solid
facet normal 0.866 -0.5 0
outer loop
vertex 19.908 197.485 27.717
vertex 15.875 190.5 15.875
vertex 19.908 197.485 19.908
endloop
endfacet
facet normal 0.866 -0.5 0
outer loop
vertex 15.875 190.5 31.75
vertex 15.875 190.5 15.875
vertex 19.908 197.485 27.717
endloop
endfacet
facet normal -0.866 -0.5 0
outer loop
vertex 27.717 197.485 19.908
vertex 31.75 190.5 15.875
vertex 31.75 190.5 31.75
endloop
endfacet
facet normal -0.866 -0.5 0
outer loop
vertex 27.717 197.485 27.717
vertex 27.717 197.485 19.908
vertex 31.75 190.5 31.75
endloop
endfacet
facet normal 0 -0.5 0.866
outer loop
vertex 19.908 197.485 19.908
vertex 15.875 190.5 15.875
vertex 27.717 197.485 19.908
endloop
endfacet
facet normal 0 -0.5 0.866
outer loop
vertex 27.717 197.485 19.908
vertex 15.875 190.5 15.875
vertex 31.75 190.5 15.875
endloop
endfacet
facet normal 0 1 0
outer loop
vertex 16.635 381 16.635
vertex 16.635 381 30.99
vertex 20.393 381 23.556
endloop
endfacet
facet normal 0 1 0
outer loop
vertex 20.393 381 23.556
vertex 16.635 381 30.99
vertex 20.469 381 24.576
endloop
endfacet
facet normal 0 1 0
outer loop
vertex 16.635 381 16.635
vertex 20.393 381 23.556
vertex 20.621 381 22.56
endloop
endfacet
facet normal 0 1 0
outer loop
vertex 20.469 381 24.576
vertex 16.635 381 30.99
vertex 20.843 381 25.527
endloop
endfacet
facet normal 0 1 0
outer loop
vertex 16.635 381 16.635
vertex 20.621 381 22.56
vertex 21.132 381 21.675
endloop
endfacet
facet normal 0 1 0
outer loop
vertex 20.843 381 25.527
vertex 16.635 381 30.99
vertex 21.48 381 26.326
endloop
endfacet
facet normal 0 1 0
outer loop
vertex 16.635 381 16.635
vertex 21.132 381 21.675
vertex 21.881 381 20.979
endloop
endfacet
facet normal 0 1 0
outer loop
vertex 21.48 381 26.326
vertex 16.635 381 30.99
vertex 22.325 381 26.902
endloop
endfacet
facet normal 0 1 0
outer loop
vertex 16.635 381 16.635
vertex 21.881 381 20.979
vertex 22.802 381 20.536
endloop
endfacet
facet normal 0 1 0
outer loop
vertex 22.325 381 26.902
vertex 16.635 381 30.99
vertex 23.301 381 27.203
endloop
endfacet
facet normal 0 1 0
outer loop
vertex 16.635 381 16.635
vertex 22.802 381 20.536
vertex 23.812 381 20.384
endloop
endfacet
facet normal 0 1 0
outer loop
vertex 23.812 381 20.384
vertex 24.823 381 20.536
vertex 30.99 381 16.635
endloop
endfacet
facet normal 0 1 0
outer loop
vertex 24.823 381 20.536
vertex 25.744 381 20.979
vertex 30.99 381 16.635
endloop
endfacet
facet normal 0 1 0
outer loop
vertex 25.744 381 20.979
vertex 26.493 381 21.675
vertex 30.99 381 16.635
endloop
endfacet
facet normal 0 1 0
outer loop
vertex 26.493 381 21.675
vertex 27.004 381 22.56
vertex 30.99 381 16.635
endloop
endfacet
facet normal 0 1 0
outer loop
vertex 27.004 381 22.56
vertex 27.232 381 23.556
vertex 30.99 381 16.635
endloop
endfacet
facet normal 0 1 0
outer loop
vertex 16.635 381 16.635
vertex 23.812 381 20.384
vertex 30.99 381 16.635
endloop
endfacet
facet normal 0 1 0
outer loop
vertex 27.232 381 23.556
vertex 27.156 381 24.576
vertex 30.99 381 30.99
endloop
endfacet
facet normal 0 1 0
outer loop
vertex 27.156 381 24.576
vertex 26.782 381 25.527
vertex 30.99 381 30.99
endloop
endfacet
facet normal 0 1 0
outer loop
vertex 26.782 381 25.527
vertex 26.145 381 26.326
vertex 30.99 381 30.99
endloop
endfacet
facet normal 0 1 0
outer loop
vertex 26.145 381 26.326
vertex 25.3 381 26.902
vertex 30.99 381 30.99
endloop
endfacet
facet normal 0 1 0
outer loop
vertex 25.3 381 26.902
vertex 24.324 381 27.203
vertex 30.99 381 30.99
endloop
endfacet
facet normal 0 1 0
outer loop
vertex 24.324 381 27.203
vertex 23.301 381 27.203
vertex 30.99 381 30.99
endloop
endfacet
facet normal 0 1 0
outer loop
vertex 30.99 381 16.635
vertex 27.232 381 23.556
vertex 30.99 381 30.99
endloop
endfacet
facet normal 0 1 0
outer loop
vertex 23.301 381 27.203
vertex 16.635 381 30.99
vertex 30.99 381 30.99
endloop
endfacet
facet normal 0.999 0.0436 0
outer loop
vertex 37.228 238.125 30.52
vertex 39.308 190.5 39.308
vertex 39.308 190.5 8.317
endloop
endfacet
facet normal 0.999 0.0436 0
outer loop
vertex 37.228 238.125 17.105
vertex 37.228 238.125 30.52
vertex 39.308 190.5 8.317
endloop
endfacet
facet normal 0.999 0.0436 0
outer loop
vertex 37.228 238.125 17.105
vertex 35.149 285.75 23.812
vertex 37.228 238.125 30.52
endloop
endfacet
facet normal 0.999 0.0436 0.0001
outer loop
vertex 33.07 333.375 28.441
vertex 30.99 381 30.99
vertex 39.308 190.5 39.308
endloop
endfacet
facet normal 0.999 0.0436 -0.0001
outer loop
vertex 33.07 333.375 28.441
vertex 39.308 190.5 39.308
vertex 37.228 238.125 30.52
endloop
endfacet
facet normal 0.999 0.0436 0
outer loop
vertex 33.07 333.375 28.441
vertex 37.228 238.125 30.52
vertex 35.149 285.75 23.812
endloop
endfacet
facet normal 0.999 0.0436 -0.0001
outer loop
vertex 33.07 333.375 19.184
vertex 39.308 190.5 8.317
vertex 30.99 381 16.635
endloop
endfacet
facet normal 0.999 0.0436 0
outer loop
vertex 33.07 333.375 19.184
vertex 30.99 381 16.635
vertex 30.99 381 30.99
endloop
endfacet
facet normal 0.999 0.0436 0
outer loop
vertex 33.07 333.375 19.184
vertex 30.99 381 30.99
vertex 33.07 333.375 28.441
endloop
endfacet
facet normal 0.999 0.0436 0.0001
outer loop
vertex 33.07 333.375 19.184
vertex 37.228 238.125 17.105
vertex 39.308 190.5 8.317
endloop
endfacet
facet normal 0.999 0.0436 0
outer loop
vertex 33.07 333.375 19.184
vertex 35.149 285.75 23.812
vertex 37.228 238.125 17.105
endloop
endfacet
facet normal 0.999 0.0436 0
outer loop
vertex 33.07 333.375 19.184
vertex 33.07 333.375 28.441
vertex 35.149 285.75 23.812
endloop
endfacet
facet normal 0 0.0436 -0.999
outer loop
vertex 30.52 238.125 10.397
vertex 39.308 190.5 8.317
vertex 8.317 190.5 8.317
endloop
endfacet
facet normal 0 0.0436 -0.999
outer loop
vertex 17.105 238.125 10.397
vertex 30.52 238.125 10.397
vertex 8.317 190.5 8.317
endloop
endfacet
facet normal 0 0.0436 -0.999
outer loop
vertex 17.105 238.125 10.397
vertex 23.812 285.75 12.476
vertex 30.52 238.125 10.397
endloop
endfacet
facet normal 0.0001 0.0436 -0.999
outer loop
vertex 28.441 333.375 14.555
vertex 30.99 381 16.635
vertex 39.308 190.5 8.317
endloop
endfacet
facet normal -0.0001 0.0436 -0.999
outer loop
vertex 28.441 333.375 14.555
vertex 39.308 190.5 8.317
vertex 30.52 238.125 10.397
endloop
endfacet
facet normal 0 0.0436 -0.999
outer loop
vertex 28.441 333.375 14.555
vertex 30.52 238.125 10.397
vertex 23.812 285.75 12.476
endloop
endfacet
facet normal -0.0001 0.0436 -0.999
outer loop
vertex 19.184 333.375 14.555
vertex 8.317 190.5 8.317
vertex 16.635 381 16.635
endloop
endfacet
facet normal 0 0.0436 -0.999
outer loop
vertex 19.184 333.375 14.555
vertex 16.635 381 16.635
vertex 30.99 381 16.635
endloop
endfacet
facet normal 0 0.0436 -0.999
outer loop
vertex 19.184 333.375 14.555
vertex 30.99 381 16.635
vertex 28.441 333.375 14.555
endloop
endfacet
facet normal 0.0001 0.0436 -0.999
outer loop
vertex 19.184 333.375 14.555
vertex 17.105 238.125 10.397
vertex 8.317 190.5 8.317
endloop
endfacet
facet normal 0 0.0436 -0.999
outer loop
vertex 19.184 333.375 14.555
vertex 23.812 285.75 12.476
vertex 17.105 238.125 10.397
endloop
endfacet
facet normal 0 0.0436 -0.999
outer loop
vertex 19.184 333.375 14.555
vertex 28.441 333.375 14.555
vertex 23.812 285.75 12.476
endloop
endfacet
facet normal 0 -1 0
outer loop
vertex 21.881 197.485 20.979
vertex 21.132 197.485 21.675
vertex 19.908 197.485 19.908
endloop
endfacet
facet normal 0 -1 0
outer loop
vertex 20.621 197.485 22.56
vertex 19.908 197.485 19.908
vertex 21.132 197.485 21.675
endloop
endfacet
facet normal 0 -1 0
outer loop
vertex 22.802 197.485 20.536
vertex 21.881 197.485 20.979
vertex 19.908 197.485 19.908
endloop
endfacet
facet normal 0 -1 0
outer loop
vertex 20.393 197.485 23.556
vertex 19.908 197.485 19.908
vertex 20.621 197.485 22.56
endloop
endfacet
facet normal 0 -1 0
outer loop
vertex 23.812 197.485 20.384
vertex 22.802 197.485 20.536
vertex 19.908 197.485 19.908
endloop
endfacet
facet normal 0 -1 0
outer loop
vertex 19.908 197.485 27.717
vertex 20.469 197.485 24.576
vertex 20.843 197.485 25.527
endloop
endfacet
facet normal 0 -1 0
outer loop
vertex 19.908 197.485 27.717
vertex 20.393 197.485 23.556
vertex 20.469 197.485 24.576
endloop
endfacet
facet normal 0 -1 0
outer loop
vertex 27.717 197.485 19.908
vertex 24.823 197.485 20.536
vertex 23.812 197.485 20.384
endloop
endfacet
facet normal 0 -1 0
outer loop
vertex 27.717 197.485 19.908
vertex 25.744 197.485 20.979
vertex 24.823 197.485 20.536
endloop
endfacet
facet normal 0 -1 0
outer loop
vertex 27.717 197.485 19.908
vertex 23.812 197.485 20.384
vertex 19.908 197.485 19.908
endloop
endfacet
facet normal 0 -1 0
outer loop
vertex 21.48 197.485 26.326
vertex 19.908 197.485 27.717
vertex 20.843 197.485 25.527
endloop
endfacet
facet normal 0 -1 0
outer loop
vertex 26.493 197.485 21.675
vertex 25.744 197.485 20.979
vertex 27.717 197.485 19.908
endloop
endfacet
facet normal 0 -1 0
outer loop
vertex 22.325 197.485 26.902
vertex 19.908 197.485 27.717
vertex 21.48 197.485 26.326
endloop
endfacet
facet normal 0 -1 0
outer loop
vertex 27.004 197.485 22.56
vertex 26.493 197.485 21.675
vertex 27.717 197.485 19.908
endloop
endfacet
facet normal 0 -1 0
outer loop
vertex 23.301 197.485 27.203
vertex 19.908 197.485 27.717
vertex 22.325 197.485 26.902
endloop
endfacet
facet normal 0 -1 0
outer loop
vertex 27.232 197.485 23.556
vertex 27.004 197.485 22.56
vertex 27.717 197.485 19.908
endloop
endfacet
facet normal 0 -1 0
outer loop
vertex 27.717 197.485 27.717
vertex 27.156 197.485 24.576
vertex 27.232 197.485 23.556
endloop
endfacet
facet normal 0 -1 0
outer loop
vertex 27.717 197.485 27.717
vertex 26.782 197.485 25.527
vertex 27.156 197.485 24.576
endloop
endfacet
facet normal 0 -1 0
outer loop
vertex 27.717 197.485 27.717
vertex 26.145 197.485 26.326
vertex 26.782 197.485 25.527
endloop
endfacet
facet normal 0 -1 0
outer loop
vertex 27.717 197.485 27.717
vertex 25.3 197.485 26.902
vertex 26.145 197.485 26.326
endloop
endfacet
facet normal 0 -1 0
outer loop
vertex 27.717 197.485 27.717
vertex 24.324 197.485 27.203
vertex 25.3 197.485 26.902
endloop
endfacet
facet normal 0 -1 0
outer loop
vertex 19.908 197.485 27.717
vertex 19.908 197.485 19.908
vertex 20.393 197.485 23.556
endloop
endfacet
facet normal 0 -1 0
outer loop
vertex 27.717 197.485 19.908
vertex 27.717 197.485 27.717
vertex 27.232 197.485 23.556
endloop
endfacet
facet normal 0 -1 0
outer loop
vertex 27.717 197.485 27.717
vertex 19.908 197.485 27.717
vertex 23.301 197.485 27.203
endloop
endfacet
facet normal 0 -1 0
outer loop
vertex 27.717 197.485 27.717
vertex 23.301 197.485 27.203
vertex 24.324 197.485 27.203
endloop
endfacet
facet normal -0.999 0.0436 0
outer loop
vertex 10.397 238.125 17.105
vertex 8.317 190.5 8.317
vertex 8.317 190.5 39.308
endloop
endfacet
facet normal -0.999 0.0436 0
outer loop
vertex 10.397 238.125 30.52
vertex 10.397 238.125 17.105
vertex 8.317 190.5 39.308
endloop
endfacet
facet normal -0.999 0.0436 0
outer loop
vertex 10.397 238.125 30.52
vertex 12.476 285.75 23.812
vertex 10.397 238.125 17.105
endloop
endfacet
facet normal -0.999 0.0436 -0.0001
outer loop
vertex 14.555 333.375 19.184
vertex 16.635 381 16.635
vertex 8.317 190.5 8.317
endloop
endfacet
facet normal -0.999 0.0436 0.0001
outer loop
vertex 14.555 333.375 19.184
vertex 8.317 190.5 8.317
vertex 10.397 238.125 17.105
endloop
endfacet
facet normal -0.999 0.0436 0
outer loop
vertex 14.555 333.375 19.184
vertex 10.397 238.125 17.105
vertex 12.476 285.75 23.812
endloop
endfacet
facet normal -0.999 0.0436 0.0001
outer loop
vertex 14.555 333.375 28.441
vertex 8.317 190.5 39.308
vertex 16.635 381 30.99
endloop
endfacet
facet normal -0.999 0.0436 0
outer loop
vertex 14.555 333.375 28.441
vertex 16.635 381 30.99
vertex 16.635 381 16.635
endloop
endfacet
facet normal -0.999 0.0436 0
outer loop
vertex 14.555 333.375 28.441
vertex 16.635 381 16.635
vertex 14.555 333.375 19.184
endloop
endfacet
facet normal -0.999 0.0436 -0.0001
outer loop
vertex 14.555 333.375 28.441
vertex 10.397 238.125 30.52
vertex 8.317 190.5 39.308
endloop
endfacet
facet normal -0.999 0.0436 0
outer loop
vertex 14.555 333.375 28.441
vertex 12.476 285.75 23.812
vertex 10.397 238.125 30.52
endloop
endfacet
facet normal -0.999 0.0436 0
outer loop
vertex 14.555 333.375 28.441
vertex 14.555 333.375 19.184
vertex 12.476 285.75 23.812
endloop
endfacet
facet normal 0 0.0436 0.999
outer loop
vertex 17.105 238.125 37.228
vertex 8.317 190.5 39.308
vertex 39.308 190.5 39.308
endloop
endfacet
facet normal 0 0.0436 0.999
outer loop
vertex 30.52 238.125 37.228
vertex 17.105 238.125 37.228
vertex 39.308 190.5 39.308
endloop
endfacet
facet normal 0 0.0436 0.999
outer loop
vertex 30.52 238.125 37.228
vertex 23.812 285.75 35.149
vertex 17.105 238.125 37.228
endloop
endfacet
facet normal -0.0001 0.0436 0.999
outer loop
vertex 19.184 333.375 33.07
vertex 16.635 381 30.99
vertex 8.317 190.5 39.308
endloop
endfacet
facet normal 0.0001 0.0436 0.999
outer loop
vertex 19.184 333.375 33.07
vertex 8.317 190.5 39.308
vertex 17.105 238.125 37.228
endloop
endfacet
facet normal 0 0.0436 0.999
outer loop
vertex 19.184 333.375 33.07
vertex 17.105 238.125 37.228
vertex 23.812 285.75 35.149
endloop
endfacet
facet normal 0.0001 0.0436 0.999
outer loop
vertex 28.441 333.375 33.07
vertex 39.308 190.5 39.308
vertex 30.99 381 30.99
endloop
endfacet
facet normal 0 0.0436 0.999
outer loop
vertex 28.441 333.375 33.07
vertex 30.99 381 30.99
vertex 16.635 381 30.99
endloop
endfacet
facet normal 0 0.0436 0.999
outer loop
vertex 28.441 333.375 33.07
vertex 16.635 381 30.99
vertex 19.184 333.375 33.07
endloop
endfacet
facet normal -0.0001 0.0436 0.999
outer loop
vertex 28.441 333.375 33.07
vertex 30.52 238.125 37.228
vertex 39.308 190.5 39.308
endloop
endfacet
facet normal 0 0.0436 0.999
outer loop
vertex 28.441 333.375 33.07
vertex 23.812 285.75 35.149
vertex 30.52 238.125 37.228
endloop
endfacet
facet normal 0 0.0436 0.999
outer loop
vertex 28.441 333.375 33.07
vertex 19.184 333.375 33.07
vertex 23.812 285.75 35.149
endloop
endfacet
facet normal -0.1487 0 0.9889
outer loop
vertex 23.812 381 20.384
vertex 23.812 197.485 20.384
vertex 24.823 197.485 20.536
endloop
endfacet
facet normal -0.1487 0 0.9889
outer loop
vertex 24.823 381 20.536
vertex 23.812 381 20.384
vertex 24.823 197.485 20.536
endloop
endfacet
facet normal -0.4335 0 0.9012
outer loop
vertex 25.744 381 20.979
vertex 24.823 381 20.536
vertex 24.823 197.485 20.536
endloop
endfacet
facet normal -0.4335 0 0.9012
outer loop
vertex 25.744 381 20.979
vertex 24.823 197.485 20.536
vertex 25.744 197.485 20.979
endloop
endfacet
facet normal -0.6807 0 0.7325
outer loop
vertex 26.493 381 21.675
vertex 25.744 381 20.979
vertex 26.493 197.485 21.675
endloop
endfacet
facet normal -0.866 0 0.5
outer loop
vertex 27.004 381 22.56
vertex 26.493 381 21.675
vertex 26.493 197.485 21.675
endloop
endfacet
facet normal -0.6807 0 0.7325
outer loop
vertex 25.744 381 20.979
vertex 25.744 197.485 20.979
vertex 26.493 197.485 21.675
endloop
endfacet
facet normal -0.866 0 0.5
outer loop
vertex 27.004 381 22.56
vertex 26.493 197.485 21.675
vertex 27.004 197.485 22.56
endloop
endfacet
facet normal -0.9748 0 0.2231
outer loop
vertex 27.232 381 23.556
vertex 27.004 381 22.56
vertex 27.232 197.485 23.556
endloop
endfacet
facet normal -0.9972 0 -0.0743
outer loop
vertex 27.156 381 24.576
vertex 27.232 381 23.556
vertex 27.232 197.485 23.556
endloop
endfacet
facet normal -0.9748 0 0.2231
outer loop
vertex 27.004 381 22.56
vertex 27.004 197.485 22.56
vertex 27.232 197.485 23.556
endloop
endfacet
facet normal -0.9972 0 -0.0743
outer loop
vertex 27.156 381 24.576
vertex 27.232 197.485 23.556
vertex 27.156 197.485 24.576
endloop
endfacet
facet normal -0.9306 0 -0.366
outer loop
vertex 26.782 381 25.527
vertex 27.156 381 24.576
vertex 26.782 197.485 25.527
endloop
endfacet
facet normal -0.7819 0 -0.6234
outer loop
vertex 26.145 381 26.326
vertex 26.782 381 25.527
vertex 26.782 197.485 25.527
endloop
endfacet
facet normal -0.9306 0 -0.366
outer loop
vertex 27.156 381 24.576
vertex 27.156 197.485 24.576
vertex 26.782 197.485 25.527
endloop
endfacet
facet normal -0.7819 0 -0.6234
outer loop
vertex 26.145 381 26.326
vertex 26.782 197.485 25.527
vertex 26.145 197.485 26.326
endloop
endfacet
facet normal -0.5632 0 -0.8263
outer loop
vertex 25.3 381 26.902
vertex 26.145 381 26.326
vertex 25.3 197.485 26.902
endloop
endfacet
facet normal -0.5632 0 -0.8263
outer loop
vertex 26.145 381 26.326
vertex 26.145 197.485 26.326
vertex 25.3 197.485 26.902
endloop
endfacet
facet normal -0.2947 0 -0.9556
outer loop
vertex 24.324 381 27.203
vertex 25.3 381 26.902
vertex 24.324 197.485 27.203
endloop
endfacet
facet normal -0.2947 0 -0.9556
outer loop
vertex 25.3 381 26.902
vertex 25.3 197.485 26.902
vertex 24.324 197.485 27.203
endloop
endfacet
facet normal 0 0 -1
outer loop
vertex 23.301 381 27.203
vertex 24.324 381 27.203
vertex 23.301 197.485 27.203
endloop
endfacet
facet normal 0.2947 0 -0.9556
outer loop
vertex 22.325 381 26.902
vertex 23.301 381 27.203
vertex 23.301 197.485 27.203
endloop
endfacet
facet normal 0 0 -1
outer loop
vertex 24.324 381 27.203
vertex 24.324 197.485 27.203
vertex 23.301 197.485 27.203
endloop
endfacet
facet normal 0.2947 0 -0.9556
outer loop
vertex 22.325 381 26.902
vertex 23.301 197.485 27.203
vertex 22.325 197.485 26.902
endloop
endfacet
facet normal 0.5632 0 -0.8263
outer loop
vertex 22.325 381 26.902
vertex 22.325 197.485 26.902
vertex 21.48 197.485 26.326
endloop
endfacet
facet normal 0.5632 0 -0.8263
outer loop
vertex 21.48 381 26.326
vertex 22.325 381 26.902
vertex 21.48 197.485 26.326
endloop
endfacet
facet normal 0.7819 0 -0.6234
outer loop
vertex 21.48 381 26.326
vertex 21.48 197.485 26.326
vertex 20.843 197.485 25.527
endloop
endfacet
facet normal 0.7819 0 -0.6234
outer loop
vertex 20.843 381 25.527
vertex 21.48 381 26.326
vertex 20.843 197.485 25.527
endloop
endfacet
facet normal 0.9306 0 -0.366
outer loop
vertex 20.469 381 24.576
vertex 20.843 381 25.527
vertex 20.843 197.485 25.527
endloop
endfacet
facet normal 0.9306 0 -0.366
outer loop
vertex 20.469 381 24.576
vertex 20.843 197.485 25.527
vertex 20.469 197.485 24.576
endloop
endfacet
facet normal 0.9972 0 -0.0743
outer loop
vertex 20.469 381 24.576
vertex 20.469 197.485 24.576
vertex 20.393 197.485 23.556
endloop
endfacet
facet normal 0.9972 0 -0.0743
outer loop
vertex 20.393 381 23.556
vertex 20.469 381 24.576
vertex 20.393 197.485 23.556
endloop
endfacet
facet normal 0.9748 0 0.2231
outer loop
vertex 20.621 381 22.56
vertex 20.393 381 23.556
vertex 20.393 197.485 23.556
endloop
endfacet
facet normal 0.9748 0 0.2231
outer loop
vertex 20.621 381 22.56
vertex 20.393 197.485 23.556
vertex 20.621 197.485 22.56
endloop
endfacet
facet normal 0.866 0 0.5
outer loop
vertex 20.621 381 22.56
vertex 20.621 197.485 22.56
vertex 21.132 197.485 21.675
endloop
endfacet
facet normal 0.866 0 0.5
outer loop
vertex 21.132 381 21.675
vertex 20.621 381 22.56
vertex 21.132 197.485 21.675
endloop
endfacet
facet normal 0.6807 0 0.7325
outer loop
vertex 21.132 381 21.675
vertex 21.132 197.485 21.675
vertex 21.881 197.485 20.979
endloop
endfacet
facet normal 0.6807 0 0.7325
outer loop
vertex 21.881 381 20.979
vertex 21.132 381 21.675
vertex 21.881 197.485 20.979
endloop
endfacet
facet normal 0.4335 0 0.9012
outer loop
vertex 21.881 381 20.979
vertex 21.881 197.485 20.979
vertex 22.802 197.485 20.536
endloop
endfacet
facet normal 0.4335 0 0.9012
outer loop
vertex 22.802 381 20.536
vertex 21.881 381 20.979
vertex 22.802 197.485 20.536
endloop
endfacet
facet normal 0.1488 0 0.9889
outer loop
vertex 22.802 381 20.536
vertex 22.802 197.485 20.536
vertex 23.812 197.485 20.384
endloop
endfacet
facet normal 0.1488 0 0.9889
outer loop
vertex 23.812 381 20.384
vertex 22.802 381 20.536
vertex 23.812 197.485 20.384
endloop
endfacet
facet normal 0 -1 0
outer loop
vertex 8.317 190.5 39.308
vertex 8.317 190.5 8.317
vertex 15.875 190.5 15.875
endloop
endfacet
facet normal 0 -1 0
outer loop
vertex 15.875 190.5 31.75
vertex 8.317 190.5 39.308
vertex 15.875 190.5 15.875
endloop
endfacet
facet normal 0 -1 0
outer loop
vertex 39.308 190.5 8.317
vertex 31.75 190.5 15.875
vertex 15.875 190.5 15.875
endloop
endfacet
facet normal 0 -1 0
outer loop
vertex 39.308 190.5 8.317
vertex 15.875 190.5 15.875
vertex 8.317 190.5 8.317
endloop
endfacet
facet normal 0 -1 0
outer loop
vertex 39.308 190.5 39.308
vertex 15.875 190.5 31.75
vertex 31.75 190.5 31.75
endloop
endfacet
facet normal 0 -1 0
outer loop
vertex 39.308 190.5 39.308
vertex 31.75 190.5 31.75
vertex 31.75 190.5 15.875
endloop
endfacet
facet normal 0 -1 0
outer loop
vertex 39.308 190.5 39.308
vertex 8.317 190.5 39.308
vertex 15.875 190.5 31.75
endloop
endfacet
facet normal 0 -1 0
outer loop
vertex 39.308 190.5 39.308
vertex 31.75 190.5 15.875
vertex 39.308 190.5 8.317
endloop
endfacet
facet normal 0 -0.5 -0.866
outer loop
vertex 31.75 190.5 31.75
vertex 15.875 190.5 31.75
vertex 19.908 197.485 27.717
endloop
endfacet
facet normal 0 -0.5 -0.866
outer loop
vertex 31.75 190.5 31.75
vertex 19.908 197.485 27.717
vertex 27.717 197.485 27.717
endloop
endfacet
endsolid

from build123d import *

# Parameters (mm, degrees)
SKETCH1_W           = 47.625
SKETCH1_H           = 47.625
BOSS_EXTRUDE1_DEPTH = 381
BOSS_EXTRUDE1_TAPER = 2.5
SKETCH2_R           = 3.429
CUT_EXTRUDE1_DEPTH  = 381
SKETCH3_W           = 47.625
SKETCH3_H           = 47.625
CUT_EXTRUDE2_DEPTH  = 190.5
SKETCH4_W           = 15.875
SKETCH4_H           = 15.875
CUT_EXTRUDE3_DEPTH  = 6.985
CUT_EXTRUDE3_DRAFT  = -30


with BuildPart() as part:
    # Sketch1 → Boss-Extrude1 (new body)
    with BuildSketch(Plane(origin=(0, 0, 0), x_dir=(1, 0, 0), z_dir=(0, 1, 0))):
        with Locations((23.8125, -23.8125)):
            Rectangle(SKETCH1_W, SKETCH1_H)
    extrude(amount=BOSS_EXTRUDE1_DEPTH, taper=BOSS_EXTRUDE1_TAPER)

    # Sketch2 → Cut-Extrude1 (cut)
    with BuildSketch(Plane.XZ):
        with Locations(Location((23.8125, 23.8125, 0), (0, 0, 270))):
            Circle(SKETCH2_R)
    extrude(amount=-CUT_EXTRUDE1_DEPTH, mode=Mode.SUBTRACT)

    # Sketch3 → Cut-Extrude2 (cut)
    with BuildSketch(Plane.XZ):
        with Locations((23.8125, 23.8125)):
            Rectangle(SKETCH3_W, SKETCH3_H)
    extrude(amount=-CUT_EXTRUDE2_DEPTH, mode=Mode.SUBTRACT)


with BuildPart() as cut_extrude3_tool:
    # Sketch4 → Cut-Extrude3 (with draft: the straight prism first)
    with BuildSketch(Plane.XZ.offset(-190.5)):
        with Locations((23.8125, 23.8125)):
            Rectangle(SKETCH4_W, SKETCH4_H)
    extrude(amount=-CUT_EXTRUDE3_DEPTH)
    # Cut-Extrude3: the draft: its side faces are tilted about the plane it starts from
    cut_extrude3_sides = [cut_extrude3_tool.faces().sort_by_distance(p)[0] for p in [
        (15.875, 193.9925, 23.8125),
        (23.8125, 193.9925, 15.875),
        (31.75, 193.9925, 23.8125),
        (23.8125, 193.9925, 31.75),
    ]]
    draft(cut_extrude3_sides, Plane.XZ.offset(-190.5), CUT_EXTRUDE3_DRAFT)


with BuildPart() as part_1:
    add(part.part)

    # Cut-Extrude3: cut by cut_extrude3_tool
    add(cut_extrude3_tool.part, mode=Mode.SUBTRACT)


solid = part_1.part
